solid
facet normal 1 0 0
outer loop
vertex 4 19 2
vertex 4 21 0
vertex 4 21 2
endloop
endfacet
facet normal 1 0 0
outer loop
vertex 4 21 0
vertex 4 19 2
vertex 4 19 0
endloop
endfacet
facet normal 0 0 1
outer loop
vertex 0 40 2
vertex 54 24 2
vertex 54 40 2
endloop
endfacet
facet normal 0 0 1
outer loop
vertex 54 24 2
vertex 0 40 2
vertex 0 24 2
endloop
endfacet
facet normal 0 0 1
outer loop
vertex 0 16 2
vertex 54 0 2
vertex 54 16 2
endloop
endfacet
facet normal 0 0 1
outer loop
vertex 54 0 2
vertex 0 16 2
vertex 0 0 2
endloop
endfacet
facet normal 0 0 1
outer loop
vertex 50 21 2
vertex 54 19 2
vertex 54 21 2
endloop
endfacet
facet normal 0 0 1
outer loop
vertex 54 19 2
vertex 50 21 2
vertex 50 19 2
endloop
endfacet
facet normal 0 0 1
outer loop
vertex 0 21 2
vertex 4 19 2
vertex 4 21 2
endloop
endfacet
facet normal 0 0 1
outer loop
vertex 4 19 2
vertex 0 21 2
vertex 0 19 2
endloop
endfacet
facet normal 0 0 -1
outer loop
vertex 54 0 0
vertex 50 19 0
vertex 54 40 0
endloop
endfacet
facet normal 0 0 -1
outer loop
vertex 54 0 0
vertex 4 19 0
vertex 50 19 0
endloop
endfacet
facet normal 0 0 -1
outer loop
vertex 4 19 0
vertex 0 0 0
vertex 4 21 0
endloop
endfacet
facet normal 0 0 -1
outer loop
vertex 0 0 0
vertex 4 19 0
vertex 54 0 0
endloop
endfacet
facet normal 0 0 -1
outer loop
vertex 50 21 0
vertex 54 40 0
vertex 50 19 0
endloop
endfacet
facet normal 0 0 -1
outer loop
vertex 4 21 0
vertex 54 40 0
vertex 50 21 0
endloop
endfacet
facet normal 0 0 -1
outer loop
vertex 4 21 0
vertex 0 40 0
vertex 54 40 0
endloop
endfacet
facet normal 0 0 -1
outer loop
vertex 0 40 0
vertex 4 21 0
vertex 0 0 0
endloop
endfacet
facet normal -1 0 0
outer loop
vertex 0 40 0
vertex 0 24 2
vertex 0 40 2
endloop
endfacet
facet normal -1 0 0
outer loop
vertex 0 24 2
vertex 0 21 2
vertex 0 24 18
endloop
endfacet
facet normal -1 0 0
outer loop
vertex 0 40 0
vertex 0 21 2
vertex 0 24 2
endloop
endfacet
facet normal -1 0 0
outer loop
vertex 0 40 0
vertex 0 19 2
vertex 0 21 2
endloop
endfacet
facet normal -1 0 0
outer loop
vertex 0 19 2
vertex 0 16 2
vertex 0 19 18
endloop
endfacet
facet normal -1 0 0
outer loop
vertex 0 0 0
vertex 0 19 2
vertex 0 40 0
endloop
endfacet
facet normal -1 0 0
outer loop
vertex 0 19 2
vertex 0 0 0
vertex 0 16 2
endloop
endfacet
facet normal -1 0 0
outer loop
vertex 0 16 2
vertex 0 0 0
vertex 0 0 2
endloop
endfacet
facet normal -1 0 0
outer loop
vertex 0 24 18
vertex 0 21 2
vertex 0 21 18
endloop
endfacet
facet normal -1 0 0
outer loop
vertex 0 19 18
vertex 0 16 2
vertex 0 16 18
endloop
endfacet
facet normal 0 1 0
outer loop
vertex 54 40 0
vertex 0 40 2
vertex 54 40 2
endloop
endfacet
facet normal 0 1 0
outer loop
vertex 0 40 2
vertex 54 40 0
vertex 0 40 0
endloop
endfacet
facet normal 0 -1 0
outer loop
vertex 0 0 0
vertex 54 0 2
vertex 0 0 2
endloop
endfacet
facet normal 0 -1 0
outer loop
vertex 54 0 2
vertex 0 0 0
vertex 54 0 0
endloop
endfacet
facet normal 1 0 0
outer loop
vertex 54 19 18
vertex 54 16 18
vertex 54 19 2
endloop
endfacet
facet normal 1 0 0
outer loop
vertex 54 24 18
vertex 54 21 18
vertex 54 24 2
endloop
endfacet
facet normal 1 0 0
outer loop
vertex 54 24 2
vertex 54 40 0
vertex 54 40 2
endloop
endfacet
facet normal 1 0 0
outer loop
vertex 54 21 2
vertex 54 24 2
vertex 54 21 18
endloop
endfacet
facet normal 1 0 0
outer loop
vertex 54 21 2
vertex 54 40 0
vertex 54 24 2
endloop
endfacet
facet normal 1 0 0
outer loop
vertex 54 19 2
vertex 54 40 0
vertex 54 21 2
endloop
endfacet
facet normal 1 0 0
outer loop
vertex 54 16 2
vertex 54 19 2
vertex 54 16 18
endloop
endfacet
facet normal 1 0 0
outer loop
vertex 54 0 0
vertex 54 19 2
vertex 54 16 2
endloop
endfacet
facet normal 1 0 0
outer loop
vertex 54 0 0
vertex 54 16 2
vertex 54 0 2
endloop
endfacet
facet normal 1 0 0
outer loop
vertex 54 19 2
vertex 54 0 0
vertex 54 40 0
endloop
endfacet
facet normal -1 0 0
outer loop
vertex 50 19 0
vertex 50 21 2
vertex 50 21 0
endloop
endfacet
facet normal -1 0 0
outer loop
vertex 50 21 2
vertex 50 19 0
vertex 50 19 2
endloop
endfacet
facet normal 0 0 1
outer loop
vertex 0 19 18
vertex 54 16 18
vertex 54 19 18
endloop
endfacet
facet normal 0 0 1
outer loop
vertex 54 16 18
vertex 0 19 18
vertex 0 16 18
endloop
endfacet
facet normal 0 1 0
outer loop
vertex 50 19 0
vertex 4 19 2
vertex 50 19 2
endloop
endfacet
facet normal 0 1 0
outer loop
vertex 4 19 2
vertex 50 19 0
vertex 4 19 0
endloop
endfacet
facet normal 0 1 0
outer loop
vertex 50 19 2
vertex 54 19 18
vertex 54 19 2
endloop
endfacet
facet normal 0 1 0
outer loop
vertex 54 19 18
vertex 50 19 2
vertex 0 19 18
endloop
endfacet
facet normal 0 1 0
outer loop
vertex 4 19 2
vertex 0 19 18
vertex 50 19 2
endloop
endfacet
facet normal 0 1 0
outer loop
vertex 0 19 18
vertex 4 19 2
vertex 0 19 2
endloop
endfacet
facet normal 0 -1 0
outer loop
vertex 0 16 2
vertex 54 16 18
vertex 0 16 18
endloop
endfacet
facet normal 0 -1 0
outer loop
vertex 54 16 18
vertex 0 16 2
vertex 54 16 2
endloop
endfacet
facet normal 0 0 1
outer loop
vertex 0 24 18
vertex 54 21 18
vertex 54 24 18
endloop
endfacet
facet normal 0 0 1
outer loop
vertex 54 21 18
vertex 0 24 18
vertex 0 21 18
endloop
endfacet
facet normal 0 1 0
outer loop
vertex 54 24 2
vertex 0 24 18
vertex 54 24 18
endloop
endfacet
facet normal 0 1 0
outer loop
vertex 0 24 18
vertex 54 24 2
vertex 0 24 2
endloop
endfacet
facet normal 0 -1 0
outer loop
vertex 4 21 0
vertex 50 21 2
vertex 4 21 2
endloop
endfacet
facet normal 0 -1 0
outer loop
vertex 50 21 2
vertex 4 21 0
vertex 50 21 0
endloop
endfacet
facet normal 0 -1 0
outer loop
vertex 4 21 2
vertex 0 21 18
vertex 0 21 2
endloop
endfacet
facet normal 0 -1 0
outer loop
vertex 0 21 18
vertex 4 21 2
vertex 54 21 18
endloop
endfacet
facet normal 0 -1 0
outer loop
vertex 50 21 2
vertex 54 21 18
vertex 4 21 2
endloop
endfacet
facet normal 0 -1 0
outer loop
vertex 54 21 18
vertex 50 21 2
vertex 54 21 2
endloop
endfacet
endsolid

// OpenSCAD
$fn=64;

width=54;
baseLenght=40;

dividerThickness=2;
dividerHeight=51;

baseFloorThickness=2;
baseWallThickness=3;
baseBridgeWidth=4;
baseHeight=15;


module divider(){
  difference(){
    translate([0, baseLenght/2-dividerThickness/2, 0])
      color("red")
      cube([width, dividerThickness-0.2,  dividerHeight]);

    cube([baseBridgeWidth, baseLenght, baseFloorThickness]);
    translate([width-baseBridgeWidth, 0, 0])
       cube([baseBridgeWidth, baseLenght, baseFloorThickness]);
  }
}

module base(){
    cube([baseBridgeWidth, baseLenght, baseFloorThickness]);
    translate([width-baseBridgeWidth, 0, 0])
       cube([baseBridgeWidth, baseLenght, baseFloorThickness]);
  
    translate([0, baseLenght/2-baseWallThickness-dividerThickness/2, 0])
       cube([width, baseWallThickness,  baseWallThickness+baseHeight]);
    translate([0, baseLenght/2+dividerThickness/2, 0])
       cube([width, baseWallThickness,  baseWallThickness+baseHeight]);     
  
  
    translate([0, 0, 0])
       cube([width, baseLenght/2-dividerThickness/2,  baseFloorThickness]);
    translate([0, baseLenght/2+dividerThickness/2, 0])
       cube([width, baseLenght/2-dividerThickness/2,  baseFloorThickness]);
    /*
    difference(){
    translate([0, 0, 0])
      cube([width, baseLenght/2-dividerThickness/2,  baseThickness+baseHeight]);
  
      translate([0,-7,22]) 
        rotate([0,90,0])
          linear_extrude(height=width+1)
            circle(d=40);
    }
    */
      
    
}

module main(){
    base();
    //divider();
}

main();
